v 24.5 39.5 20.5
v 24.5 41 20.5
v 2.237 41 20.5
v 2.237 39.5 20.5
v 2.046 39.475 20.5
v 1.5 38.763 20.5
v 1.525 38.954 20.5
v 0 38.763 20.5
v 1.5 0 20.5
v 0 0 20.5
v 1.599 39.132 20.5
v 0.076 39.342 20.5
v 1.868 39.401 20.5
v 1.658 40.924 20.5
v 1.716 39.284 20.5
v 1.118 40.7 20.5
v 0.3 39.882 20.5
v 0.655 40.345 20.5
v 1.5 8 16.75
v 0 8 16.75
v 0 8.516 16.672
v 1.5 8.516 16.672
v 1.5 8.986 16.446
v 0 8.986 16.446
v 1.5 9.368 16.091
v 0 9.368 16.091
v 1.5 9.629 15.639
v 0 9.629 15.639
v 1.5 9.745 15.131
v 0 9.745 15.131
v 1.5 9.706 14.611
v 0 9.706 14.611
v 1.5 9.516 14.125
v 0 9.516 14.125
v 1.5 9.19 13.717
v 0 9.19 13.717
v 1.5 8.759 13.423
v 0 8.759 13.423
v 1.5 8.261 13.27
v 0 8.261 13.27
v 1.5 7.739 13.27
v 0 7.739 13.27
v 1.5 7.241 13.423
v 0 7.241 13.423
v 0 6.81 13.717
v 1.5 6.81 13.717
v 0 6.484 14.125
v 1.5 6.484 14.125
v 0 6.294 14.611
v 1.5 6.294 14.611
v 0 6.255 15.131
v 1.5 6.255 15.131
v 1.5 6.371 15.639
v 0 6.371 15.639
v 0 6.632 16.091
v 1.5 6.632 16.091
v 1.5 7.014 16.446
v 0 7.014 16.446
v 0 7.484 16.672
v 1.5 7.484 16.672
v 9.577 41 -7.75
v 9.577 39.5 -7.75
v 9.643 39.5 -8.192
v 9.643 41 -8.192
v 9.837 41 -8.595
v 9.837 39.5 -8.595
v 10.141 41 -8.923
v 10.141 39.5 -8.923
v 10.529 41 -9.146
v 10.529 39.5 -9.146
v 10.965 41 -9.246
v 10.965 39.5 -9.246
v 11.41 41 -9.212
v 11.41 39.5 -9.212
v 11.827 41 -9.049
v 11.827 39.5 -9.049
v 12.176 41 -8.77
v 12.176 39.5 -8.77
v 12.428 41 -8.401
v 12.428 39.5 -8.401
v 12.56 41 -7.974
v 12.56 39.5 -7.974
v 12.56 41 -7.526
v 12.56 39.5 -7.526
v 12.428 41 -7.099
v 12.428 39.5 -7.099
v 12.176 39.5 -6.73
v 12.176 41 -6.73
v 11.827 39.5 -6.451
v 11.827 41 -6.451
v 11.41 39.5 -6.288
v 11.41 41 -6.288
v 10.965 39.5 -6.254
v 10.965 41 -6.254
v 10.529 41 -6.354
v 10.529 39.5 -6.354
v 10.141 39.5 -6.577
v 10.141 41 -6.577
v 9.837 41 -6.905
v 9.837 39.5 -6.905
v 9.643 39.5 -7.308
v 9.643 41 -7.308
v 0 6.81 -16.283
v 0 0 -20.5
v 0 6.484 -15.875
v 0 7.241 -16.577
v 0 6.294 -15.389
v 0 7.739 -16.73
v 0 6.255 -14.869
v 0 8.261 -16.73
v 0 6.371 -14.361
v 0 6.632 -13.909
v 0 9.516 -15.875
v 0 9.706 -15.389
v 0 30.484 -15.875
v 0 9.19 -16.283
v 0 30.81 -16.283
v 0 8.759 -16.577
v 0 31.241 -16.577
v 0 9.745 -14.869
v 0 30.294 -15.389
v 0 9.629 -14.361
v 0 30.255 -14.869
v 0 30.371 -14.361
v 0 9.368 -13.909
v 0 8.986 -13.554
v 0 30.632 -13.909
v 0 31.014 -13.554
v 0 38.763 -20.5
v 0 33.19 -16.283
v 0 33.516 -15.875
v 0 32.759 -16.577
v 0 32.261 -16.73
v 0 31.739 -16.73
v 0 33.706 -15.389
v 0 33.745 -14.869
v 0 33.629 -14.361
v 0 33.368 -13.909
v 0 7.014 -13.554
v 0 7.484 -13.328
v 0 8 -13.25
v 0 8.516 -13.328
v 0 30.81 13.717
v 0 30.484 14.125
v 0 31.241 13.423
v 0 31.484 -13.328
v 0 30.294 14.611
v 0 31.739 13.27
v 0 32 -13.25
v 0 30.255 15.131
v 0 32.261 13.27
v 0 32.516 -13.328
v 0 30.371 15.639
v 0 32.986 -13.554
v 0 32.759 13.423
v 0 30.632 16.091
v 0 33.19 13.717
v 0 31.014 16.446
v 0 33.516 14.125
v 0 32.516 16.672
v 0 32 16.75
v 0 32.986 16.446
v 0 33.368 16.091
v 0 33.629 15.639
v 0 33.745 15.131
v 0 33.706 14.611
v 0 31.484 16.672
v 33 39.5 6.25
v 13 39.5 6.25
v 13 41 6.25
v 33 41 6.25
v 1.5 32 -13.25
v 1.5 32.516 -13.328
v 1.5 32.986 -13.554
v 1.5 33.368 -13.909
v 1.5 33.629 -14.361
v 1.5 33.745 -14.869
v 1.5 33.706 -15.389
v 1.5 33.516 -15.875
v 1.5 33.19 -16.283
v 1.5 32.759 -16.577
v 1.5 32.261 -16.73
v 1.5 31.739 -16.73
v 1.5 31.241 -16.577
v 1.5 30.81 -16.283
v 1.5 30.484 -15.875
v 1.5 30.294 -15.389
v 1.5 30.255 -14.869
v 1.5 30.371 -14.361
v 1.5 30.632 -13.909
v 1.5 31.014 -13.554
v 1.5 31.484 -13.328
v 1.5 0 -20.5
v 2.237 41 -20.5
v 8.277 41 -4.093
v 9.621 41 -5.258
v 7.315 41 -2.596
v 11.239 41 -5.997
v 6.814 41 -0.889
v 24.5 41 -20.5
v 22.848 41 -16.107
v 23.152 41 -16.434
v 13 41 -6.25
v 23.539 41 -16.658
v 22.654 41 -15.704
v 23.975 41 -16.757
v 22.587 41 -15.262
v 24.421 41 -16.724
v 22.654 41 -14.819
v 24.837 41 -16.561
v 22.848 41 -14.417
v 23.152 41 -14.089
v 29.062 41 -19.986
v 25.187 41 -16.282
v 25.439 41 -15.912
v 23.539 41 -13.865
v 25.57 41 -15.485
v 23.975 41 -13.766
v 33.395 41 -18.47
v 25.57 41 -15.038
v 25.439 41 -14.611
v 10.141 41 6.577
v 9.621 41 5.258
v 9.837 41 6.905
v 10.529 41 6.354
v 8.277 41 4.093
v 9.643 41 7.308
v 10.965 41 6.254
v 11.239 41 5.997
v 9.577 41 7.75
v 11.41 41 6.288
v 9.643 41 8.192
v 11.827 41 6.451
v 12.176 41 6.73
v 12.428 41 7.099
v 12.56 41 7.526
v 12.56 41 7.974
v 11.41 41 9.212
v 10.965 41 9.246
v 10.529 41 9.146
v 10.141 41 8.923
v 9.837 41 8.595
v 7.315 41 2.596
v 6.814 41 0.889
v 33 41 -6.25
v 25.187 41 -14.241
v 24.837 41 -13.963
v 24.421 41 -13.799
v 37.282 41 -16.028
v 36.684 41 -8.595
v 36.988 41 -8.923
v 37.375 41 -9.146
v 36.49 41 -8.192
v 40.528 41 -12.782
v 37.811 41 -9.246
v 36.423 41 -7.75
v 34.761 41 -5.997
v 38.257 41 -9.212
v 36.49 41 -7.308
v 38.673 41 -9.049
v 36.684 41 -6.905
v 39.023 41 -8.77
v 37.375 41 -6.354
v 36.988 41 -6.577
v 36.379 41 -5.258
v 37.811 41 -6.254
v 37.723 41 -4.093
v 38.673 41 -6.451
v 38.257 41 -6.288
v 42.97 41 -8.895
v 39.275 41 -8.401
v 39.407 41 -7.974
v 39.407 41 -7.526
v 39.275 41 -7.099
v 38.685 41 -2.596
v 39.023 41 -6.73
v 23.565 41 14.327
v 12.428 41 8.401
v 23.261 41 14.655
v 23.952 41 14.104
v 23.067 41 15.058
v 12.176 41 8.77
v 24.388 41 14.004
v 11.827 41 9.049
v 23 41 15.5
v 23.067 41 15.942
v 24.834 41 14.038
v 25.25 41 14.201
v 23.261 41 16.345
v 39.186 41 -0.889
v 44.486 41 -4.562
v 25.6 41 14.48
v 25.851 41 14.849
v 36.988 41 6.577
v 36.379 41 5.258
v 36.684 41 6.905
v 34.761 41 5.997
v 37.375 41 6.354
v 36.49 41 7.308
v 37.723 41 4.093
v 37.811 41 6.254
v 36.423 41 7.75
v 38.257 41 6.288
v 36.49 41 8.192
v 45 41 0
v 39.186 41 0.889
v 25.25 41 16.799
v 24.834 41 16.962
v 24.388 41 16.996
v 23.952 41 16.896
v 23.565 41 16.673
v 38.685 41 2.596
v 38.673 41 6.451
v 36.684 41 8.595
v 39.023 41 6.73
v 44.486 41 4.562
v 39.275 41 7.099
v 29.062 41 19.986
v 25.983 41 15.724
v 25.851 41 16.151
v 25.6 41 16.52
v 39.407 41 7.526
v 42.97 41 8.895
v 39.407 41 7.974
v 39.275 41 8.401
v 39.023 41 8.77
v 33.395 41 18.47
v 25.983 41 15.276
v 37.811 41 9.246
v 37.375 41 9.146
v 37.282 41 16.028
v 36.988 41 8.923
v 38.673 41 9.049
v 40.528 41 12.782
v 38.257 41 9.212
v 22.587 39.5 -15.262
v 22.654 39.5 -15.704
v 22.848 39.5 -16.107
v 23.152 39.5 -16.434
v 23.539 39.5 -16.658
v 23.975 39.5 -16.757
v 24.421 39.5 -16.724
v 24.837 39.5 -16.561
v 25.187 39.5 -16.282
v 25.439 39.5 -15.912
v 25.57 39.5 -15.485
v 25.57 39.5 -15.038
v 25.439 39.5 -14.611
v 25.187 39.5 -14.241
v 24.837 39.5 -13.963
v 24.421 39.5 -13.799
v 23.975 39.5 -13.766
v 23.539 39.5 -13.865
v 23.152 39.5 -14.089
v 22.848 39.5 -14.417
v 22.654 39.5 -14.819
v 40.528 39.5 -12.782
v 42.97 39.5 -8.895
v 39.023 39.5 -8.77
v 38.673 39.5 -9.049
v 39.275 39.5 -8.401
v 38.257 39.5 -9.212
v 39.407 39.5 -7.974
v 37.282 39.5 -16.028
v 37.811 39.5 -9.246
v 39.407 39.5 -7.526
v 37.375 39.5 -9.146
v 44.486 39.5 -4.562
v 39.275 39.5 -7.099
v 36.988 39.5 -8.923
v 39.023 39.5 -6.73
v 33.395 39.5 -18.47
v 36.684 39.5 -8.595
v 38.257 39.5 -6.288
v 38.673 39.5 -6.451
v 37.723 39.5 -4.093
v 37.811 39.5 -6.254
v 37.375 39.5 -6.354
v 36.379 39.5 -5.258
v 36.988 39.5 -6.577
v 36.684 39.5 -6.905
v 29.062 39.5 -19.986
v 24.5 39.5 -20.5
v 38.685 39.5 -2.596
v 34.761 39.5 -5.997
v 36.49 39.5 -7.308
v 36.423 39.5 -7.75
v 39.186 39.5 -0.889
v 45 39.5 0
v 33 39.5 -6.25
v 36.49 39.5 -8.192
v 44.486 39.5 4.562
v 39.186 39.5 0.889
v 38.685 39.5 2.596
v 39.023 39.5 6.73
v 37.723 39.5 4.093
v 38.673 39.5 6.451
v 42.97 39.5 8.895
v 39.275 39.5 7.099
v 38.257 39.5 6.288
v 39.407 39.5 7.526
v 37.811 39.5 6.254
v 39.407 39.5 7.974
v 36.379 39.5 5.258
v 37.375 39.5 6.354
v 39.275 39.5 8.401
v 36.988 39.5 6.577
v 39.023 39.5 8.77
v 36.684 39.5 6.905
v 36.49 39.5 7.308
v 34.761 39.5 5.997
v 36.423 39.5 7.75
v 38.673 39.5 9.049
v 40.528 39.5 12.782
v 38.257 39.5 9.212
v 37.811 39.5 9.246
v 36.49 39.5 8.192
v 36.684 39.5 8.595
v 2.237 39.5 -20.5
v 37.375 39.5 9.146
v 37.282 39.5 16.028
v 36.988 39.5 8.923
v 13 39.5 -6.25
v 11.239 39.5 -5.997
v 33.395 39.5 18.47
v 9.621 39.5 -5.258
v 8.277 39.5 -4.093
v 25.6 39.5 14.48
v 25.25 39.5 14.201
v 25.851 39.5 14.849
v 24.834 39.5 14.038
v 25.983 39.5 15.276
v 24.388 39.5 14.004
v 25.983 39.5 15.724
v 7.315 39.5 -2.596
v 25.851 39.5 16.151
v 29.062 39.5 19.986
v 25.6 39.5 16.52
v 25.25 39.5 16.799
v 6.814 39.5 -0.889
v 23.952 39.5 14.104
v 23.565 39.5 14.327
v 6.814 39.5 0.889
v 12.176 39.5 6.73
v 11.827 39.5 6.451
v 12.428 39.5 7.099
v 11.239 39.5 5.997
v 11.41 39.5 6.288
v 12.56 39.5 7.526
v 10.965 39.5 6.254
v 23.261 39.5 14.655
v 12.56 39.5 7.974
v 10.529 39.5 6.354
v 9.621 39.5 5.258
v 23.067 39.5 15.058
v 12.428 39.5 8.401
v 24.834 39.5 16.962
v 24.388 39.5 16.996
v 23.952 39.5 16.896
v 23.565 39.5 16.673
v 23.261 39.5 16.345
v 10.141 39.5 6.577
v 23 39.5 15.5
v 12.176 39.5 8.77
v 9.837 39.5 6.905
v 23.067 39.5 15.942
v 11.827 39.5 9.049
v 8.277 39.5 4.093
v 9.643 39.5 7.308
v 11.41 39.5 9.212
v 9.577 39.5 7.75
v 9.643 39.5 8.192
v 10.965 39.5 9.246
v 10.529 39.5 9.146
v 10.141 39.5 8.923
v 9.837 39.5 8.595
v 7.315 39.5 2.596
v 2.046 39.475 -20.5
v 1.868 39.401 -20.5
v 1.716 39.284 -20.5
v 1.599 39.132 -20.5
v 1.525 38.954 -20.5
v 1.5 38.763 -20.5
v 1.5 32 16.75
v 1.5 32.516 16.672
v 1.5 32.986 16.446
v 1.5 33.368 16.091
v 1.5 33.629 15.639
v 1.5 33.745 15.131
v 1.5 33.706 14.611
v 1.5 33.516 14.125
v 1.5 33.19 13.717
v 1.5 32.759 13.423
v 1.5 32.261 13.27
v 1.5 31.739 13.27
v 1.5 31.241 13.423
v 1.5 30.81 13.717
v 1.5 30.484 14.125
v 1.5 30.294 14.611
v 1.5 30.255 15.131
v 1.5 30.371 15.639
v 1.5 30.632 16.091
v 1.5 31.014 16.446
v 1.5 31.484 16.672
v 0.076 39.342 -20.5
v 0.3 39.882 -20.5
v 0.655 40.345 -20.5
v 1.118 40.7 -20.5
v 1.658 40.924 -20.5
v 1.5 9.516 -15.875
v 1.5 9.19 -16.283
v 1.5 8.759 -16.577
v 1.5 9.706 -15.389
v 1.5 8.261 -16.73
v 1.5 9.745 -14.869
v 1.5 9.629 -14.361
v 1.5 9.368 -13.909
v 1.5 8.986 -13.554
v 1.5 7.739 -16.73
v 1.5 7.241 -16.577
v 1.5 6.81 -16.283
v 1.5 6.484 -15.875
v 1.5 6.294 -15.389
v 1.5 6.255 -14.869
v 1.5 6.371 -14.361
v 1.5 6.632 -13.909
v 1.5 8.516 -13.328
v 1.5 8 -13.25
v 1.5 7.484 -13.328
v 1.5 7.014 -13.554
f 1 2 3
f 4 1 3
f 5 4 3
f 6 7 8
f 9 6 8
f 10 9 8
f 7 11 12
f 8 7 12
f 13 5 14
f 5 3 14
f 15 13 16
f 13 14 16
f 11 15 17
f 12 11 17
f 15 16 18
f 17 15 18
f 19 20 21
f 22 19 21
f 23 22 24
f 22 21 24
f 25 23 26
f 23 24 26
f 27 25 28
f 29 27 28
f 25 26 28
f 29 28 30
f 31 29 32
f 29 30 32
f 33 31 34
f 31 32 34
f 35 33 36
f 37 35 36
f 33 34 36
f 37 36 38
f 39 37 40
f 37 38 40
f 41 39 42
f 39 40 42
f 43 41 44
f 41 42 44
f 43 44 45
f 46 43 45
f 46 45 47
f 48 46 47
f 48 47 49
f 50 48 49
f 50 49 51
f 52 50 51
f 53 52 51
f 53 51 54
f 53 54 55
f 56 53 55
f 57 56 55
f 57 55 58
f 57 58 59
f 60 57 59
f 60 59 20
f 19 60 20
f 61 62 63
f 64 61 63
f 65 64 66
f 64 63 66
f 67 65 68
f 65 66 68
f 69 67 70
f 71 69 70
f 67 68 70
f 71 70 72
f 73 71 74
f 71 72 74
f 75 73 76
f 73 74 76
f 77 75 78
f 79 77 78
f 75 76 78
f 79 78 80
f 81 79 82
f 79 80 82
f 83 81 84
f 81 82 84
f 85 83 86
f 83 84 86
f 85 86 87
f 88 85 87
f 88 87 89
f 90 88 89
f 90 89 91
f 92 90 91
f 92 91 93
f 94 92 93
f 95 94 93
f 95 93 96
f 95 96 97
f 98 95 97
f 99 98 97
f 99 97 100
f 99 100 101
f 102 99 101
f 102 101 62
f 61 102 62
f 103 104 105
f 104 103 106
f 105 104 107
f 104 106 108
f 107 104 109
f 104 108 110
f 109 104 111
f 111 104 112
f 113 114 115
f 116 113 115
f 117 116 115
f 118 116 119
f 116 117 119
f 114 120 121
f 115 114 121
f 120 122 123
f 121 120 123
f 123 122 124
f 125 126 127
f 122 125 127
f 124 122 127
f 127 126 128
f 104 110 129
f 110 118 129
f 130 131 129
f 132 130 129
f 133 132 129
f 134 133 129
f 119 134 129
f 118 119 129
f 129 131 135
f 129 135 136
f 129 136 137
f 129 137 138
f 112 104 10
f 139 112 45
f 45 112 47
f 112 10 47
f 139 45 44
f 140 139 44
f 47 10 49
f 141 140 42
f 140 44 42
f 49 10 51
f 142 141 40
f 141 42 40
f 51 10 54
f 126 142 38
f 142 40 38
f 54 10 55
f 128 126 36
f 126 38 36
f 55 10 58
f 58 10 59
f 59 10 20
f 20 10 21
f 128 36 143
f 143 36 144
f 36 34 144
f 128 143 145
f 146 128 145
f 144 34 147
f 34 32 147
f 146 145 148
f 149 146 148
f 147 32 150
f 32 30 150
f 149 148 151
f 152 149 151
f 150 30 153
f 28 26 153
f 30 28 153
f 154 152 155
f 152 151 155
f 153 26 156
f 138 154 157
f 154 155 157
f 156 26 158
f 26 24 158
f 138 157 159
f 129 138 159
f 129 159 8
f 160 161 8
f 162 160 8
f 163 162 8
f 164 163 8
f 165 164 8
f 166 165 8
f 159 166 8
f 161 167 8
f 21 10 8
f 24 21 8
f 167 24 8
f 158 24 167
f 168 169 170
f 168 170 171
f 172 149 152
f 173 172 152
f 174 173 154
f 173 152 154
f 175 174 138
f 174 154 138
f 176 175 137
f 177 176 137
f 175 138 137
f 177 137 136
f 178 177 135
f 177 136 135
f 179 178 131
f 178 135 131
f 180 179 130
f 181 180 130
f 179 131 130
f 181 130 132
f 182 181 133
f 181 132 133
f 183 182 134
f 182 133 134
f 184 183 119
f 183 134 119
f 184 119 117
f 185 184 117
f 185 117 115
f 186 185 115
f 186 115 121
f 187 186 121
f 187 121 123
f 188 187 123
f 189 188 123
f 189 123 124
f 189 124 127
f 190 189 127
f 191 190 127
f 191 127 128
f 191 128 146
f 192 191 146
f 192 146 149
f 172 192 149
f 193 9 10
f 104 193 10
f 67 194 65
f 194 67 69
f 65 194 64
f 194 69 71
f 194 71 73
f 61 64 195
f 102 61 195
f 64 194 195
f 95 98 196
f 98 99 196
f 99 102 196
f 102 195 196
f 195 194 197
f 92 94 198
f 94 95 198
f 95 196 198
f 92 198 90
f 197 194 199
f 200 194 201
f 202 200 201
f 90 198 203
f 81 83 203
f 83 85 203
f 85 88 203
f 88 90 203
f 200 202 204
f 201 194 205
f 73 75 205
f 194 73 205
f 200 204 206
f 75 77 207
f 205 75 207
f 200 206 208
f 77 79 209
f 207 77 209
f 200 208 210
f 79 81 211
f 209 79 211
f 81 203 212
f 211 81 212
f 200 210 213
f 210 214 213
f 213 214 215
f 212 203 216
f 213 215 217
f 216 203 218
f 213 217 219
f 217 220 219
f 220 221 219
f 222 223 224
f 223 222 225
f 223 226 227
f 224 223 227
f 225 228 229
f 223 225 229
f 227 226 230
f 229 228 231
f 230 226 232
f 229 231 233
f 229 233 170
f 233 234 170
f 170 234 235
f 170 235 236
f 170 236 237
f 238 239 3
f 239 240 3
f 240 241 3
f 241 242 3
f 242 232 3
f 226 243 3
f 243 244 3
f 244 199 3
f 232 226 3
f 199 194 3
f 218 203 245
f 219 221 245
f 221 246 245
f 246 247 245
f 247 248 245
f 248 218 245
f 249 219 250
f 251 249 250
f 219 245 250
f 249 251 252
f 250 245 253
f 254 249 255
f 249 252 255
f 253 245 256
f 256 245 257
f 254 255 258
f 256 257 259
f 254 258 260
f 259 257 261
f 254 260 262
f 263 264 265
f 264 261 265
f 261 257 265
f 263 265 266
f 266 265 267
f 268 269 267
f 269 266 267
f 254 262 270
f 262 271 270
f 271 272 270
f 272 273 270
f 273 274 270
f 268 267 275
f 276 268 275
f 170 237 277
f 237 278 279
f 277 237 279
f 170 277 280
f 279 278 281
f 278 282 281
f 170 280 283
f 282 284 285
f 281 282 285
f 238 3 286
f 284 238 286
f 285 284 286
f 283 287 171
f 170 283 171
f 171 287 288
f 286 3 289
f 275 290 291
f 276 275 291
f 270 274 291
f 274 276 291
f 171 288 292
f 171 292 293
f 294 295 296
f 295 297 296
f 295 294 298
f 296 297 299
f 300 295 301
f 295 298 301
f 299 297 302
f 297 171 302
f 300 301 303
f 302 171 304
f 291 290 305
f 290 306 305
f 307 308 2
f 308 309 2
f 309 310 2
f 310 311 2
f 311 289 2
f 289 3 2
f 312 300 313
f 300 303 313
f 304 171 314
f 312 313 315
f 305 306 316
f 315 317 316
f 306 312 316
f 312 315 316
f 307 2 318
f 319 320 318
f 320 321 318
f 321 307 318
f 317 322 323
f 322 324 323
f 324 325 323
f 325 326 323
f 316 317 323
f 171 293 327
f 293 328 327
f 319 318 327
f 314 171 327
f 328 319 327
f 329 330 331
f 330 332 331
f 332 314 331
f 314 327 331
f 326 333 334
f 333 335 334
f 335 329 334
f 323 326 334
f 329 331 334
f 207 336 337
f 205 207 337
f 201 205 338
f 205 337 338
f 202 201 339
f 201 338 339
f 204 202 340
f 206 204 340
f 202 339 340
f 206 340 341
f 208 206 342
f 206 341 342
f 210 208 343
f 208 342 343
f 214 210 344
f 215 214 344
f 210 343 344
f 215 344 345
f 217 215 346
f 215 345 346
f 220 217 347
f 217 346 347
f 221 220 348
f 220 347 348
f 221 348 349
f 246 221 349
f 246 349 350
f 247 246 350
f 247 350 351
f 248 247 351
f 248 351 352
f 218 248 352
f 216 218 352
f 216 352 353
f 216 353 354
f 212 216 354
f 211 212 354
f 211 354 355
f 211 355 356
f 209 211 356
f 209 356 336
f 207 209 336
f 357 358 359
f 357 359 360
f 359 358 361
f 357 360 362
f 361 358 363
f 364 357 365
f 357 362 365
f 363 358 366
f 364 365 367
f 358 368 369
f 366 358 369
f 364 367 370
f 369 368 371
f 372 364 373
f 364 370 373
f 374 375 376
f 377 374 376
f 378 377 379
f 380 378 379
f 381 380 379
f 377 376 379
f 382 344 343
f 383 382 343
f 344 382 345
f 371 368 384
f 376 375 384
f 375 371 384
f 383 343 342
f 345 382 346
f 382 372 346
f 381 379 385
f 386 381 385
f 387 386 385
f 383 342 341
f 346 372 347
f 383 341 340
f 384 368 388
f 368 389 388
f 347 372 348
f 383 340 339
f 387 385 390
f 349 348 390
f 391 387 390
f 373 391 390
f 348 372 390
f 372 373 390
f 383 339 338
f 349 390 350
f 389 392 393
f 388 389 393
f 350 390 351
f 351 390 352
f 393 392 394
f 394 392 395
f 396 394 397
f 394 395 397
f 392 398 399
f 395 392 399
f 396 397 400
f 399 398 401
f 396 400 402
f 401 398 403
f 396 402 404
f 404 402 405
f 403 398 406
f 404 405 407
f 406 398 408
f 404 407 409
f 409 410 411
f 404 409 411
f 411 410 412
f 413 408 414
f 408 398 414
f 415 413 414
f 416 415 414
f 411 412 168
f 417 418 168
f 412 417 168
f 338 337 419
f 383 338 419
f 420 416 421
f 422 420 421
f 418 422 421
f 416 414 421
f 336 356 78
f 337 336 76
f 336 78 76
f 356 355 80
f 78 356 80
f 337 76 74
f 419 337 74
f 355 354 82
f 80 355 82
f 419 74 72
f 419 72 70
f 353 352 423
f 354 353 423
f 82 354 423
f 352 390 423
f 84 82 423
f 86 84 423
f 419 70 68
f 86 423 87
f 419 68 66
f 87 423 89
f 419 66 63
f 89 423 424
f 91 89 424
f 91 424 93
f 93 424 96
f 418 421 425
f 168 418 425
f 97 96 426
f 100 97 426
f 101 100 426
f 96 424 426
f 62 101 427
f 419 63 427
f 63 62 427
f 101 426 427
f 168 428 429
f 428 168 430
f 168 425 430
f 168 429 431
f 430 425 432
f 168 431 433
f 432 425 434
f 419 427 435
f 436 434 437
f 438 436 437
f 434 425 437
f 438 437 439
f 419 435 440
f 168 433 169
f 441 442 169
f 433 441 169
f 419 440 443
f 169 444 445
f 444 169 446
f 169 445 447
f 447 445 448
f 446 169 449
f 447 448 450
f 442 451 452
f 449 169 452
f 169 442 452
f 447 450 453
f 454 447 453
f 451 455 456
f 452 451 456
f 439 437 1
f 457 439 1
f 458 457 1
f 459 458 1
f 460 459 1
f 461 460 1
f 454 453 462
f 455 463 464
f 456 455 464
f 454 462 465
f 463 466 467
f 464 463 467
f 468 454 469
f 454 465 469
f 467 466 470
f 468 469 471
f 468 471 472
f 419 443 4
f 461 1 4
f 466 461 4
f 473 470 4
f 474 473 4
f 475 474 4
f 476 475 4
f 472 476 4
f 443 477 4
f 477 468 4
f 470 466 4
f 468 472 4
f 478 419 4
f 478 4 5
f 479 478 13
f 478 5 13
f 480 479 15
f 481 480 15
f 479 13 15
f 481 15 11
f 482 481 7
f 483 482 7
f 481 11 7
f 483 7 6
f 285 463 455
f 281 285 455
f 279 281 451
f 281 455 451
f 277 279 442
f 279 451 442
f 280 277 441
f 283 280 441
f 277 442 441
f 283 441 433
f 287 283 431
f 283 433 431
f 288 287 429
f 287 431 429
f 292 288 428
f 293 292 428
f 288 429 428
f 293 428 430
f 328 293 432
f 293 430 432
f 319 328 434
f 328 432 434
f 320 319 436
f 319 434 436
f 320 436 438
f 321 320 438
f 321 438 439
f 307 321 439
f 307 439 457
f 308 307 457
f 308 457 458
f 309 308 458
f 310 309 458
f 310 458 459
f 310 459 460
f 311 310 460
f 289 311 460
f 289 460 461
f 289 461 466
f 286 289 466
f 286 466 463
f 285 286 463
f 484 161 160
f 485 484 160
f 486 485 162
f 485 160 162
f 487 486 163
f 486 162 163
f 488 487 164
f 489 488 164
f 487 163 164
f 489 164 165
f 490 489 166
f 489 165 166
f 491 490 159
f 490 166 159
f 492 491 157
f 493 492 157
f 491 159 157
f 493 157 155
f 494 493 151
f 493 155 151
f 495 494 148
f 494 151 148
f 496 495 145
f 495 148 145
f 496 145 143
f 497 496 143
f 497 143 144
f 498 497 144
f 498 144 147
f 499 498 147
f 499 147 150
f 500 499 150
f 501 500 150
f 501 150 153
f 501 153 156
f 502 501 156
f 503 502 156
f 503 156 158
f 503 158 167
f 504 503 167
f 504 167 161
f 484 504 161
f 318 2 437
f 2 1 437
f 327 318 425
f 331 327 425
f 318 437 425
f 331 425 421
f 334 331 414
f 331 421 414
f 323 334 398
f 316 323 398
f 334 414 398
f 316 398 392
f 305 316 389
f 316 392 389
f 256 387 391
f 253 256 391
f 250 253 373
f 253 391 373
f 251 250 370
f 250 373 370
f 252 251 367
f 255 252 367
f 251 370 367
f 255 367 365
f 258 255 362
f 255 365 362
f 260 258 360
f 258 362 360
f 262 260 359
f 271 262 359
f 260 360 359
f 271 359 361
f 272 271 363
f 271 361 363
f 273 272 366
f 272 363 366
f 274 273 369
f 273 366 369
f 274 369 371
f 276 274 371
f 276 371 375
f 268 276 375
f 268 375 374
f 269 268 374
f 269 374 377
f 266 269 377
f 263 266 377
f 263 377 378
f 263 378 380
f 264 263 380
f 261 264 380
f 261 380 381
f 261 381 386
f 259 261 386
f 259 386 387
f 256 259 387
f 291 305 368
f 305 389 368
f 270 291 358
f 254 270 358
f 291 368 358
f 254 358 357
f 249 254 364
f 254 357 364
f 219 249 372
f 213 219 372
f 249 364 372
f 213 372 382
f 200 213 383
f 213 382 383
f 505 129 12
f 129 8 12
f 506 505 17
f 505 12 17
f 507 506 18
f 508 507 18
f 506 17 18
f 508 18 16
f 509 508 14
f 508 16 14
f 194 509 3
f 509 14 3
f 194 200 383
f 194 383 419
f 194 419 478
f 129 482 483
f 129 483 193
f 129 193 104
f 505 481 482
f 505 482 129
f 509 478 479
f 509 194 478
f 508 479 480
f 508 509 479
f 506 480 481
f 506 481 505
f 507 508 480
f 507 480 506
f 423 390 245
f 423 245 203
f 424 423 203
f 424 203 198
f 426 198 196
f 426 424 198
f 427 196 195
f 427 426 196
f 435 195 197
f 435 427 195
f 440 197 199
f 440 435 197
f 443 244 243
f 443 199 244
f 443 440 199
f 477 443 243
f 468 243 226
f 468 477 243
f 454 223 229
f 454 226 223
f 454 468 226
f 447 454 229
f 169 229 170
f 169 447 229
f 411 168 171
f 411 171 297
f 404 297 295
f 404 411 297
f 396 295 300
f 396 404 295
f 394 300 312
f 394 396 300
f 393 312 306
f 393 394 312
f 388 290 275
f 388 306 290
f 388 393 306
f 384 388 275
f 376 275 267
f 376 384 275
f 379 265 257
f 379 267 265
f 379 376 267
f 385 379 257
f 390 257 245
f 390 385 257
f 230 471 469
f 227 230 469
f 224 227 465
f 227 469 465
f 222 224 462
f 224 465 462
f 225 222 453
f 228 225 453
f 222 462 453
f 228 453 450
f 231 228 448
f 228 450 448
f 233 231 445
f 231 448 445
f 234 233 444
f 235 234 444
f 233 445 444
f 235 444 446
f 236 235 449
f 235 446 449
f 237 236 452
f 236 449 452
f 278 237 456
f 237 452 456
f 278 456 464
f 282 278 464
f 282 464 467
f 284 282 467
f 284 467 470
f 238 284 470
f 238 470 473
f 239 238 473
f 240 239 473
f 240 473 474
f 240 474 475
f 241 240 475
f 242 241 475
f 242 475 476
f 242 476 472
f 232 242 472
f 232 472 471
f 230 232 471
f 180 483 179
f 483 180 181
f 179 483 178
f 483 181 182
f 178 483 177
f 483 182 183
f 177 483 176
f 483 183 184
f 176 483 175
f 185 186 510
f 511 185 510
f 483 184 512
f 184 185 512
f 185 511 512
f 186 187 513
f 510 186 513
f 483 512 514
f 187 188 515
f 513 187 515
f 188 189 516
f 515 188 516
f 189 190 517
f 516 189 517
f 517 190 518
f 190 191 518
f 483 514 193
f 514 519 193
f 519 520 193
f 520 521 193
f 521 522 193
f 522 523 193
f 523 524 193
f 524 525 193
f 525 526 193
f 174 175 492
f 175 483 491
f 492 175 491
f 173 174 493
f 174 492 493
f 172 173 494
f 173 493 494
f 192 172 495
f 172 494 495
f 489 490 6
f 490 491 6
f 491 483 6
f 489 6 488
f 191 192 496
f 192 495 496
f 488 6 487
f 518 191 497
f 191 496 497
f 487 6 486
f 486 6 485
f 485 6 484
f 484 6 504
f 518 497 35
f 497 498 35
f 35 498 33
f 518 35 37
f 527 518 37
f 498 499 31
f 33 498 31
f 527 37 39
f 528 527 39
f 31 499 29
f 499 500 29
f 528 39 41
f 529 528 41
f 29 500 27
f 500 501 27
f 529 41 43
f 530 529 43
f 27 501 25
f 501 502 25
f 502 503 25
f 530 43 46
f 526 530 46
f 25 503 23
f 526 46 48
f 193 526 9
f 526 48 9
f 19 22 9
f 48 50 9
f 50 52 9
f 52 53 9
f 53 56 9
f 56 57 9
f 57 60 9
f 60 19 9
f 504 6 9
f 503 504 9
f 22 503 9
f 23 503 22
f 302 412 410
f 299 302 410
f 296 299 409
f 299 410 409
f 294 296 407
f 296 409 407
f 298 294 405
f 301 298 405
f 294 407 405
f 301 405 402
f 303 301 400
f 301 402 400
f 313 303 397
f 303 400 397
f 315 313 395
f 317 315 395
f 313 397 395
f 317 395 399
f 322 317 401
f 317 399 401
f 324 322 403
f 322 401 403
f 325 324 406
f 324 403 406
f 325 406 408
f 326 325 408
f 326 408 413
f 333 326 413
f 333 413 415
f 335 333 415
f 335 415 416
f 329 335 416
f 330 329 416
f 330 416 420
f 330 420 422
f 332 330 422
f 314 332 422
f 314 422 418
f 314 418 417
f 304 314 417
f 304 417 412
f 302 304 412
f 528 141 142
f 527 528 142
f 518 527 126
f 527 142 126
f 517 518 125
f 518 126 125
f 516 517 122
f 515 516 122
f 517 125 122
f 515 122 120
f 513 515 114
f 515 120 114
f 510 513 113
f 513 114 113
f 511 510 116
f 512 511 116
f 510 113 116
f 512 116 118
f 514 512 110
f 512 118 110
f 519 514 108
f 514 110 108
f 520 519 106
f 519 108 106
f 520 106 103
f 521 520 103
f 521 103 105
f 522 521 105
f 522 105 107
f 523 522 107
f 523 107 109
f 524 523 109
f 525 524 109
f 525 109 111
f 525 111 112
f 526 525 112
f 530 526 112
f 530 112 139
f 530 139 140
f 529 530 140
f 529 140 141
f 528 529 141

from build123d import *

# Parameters (mm, degrees)
SM_BASE_FLANGE_1_DEPTH = 20.5
FILLET_1_R             = 20.5
MM_1_D                 = 3
MM_1_DEPTH             = 7.5
MM_1_TIP               = 0.901290929
SKETCH_10_R            = 1.75
CUT_EXTRUDE_1_DEPTH    = 10
CUT_EXTRUDE_2_DEPTH    = 10


# Sheet-metal steps are written as plain solids
with BuildPart() as part:
    # Sketch 1 → 基体-法兰1 (new, symmetric)
    with BuildSketch(Plane.XY):
        with BuildLine():
            Line((0, 0), (0, 38.7634))
            ThreePointArc((0, 38.7634), (0.655084973, 40.344915027), (2.2366, 41))
            Line((2.2366, 41), (45, 41))
            Line((45, 41), (45, 39.5))
            Line((45, 39.5), (2.2366, 39.5))
            ThreePointArc((2.2366, 39.5), (1.715745145, 39.284254855), (1.5, 38.7634))
            Line((1.5, 38.7634), (1.5, 0))
            Line((1.5, 0), (0, 0))
        make_face()
    extrude(amount=SM_BASE_FLANGE_1_DEPTH, both=True)

    # 圆角1
    fillet_1_edges = [part.edges().sort_by_distance(p)[0] for p in [
        (45, 40.25, -20.5),
        (45, 40.25, 20.5),
    ]]
    fillet(fillet_1_edges, radius=FILLET_1_R - 0.0001)  # a hair under: the kernel refuses the full size

    # 大小mm 暗销孔1
    with Locations(Plane(origin=(0, 41, 0), x_dir=(1, 0, 0), z_dir=(0, 1, 0))):
        with Locations((24.087127043, 15.261627687), (37.923393759, 7.75), (37.923393759, -7.75), (24.5, -15.5), (11.076606241, -7.75), (11.076606241, 7.75)):
            Hole(MM_1_D / 2, depth=MM_1_DEPTH)
            with Locations((0, 0, -(MM_1_DEPTH + MM_1_TIP / 2))):  # 118° drill point
                Cone(0, MM_1_D / 2, MM_1_TIP, mode=Mode.SUBTRACT)

    # 草图10 → 切除-拉伸1 (cut)
    with BuildSketch(Plane.ZY):
        with Locations((-15, 32)):
            Circle(SKETCH_10_R)
        with Locations((15, 32)):
            Circle(SKETCH_10_R)
        with Locations((15, 8)):
            Circle(SKETCH_10_R)
        with Locations((-15, 8)):
            Circle(SKETCH_10_R)
    extrude(amount=-CUT_EXTRUDE_1_DEPTH, mode=Mode.SUBTRACT)

    # 草图11 → 切除-拉伸2 (cut)
    with BuildSketch(Plane.XZ.offset(-39.5)):
        with BuildLine():
            Line((33, -6.25), (13, -6.25))
            ThreePointArc((13, -6.25), (6.75, 0), (13, 6.25))
            Line((13, 6.25), (33, 6.25))
            ThreePointArc((33, 6.25), (39.25, 0), (33, -6.25))
        make_face()
    extrude(amount=-CUT_EXTRUDE_2_DEPTH, mode=Mode.SUBTRACT)


solid = part.part
